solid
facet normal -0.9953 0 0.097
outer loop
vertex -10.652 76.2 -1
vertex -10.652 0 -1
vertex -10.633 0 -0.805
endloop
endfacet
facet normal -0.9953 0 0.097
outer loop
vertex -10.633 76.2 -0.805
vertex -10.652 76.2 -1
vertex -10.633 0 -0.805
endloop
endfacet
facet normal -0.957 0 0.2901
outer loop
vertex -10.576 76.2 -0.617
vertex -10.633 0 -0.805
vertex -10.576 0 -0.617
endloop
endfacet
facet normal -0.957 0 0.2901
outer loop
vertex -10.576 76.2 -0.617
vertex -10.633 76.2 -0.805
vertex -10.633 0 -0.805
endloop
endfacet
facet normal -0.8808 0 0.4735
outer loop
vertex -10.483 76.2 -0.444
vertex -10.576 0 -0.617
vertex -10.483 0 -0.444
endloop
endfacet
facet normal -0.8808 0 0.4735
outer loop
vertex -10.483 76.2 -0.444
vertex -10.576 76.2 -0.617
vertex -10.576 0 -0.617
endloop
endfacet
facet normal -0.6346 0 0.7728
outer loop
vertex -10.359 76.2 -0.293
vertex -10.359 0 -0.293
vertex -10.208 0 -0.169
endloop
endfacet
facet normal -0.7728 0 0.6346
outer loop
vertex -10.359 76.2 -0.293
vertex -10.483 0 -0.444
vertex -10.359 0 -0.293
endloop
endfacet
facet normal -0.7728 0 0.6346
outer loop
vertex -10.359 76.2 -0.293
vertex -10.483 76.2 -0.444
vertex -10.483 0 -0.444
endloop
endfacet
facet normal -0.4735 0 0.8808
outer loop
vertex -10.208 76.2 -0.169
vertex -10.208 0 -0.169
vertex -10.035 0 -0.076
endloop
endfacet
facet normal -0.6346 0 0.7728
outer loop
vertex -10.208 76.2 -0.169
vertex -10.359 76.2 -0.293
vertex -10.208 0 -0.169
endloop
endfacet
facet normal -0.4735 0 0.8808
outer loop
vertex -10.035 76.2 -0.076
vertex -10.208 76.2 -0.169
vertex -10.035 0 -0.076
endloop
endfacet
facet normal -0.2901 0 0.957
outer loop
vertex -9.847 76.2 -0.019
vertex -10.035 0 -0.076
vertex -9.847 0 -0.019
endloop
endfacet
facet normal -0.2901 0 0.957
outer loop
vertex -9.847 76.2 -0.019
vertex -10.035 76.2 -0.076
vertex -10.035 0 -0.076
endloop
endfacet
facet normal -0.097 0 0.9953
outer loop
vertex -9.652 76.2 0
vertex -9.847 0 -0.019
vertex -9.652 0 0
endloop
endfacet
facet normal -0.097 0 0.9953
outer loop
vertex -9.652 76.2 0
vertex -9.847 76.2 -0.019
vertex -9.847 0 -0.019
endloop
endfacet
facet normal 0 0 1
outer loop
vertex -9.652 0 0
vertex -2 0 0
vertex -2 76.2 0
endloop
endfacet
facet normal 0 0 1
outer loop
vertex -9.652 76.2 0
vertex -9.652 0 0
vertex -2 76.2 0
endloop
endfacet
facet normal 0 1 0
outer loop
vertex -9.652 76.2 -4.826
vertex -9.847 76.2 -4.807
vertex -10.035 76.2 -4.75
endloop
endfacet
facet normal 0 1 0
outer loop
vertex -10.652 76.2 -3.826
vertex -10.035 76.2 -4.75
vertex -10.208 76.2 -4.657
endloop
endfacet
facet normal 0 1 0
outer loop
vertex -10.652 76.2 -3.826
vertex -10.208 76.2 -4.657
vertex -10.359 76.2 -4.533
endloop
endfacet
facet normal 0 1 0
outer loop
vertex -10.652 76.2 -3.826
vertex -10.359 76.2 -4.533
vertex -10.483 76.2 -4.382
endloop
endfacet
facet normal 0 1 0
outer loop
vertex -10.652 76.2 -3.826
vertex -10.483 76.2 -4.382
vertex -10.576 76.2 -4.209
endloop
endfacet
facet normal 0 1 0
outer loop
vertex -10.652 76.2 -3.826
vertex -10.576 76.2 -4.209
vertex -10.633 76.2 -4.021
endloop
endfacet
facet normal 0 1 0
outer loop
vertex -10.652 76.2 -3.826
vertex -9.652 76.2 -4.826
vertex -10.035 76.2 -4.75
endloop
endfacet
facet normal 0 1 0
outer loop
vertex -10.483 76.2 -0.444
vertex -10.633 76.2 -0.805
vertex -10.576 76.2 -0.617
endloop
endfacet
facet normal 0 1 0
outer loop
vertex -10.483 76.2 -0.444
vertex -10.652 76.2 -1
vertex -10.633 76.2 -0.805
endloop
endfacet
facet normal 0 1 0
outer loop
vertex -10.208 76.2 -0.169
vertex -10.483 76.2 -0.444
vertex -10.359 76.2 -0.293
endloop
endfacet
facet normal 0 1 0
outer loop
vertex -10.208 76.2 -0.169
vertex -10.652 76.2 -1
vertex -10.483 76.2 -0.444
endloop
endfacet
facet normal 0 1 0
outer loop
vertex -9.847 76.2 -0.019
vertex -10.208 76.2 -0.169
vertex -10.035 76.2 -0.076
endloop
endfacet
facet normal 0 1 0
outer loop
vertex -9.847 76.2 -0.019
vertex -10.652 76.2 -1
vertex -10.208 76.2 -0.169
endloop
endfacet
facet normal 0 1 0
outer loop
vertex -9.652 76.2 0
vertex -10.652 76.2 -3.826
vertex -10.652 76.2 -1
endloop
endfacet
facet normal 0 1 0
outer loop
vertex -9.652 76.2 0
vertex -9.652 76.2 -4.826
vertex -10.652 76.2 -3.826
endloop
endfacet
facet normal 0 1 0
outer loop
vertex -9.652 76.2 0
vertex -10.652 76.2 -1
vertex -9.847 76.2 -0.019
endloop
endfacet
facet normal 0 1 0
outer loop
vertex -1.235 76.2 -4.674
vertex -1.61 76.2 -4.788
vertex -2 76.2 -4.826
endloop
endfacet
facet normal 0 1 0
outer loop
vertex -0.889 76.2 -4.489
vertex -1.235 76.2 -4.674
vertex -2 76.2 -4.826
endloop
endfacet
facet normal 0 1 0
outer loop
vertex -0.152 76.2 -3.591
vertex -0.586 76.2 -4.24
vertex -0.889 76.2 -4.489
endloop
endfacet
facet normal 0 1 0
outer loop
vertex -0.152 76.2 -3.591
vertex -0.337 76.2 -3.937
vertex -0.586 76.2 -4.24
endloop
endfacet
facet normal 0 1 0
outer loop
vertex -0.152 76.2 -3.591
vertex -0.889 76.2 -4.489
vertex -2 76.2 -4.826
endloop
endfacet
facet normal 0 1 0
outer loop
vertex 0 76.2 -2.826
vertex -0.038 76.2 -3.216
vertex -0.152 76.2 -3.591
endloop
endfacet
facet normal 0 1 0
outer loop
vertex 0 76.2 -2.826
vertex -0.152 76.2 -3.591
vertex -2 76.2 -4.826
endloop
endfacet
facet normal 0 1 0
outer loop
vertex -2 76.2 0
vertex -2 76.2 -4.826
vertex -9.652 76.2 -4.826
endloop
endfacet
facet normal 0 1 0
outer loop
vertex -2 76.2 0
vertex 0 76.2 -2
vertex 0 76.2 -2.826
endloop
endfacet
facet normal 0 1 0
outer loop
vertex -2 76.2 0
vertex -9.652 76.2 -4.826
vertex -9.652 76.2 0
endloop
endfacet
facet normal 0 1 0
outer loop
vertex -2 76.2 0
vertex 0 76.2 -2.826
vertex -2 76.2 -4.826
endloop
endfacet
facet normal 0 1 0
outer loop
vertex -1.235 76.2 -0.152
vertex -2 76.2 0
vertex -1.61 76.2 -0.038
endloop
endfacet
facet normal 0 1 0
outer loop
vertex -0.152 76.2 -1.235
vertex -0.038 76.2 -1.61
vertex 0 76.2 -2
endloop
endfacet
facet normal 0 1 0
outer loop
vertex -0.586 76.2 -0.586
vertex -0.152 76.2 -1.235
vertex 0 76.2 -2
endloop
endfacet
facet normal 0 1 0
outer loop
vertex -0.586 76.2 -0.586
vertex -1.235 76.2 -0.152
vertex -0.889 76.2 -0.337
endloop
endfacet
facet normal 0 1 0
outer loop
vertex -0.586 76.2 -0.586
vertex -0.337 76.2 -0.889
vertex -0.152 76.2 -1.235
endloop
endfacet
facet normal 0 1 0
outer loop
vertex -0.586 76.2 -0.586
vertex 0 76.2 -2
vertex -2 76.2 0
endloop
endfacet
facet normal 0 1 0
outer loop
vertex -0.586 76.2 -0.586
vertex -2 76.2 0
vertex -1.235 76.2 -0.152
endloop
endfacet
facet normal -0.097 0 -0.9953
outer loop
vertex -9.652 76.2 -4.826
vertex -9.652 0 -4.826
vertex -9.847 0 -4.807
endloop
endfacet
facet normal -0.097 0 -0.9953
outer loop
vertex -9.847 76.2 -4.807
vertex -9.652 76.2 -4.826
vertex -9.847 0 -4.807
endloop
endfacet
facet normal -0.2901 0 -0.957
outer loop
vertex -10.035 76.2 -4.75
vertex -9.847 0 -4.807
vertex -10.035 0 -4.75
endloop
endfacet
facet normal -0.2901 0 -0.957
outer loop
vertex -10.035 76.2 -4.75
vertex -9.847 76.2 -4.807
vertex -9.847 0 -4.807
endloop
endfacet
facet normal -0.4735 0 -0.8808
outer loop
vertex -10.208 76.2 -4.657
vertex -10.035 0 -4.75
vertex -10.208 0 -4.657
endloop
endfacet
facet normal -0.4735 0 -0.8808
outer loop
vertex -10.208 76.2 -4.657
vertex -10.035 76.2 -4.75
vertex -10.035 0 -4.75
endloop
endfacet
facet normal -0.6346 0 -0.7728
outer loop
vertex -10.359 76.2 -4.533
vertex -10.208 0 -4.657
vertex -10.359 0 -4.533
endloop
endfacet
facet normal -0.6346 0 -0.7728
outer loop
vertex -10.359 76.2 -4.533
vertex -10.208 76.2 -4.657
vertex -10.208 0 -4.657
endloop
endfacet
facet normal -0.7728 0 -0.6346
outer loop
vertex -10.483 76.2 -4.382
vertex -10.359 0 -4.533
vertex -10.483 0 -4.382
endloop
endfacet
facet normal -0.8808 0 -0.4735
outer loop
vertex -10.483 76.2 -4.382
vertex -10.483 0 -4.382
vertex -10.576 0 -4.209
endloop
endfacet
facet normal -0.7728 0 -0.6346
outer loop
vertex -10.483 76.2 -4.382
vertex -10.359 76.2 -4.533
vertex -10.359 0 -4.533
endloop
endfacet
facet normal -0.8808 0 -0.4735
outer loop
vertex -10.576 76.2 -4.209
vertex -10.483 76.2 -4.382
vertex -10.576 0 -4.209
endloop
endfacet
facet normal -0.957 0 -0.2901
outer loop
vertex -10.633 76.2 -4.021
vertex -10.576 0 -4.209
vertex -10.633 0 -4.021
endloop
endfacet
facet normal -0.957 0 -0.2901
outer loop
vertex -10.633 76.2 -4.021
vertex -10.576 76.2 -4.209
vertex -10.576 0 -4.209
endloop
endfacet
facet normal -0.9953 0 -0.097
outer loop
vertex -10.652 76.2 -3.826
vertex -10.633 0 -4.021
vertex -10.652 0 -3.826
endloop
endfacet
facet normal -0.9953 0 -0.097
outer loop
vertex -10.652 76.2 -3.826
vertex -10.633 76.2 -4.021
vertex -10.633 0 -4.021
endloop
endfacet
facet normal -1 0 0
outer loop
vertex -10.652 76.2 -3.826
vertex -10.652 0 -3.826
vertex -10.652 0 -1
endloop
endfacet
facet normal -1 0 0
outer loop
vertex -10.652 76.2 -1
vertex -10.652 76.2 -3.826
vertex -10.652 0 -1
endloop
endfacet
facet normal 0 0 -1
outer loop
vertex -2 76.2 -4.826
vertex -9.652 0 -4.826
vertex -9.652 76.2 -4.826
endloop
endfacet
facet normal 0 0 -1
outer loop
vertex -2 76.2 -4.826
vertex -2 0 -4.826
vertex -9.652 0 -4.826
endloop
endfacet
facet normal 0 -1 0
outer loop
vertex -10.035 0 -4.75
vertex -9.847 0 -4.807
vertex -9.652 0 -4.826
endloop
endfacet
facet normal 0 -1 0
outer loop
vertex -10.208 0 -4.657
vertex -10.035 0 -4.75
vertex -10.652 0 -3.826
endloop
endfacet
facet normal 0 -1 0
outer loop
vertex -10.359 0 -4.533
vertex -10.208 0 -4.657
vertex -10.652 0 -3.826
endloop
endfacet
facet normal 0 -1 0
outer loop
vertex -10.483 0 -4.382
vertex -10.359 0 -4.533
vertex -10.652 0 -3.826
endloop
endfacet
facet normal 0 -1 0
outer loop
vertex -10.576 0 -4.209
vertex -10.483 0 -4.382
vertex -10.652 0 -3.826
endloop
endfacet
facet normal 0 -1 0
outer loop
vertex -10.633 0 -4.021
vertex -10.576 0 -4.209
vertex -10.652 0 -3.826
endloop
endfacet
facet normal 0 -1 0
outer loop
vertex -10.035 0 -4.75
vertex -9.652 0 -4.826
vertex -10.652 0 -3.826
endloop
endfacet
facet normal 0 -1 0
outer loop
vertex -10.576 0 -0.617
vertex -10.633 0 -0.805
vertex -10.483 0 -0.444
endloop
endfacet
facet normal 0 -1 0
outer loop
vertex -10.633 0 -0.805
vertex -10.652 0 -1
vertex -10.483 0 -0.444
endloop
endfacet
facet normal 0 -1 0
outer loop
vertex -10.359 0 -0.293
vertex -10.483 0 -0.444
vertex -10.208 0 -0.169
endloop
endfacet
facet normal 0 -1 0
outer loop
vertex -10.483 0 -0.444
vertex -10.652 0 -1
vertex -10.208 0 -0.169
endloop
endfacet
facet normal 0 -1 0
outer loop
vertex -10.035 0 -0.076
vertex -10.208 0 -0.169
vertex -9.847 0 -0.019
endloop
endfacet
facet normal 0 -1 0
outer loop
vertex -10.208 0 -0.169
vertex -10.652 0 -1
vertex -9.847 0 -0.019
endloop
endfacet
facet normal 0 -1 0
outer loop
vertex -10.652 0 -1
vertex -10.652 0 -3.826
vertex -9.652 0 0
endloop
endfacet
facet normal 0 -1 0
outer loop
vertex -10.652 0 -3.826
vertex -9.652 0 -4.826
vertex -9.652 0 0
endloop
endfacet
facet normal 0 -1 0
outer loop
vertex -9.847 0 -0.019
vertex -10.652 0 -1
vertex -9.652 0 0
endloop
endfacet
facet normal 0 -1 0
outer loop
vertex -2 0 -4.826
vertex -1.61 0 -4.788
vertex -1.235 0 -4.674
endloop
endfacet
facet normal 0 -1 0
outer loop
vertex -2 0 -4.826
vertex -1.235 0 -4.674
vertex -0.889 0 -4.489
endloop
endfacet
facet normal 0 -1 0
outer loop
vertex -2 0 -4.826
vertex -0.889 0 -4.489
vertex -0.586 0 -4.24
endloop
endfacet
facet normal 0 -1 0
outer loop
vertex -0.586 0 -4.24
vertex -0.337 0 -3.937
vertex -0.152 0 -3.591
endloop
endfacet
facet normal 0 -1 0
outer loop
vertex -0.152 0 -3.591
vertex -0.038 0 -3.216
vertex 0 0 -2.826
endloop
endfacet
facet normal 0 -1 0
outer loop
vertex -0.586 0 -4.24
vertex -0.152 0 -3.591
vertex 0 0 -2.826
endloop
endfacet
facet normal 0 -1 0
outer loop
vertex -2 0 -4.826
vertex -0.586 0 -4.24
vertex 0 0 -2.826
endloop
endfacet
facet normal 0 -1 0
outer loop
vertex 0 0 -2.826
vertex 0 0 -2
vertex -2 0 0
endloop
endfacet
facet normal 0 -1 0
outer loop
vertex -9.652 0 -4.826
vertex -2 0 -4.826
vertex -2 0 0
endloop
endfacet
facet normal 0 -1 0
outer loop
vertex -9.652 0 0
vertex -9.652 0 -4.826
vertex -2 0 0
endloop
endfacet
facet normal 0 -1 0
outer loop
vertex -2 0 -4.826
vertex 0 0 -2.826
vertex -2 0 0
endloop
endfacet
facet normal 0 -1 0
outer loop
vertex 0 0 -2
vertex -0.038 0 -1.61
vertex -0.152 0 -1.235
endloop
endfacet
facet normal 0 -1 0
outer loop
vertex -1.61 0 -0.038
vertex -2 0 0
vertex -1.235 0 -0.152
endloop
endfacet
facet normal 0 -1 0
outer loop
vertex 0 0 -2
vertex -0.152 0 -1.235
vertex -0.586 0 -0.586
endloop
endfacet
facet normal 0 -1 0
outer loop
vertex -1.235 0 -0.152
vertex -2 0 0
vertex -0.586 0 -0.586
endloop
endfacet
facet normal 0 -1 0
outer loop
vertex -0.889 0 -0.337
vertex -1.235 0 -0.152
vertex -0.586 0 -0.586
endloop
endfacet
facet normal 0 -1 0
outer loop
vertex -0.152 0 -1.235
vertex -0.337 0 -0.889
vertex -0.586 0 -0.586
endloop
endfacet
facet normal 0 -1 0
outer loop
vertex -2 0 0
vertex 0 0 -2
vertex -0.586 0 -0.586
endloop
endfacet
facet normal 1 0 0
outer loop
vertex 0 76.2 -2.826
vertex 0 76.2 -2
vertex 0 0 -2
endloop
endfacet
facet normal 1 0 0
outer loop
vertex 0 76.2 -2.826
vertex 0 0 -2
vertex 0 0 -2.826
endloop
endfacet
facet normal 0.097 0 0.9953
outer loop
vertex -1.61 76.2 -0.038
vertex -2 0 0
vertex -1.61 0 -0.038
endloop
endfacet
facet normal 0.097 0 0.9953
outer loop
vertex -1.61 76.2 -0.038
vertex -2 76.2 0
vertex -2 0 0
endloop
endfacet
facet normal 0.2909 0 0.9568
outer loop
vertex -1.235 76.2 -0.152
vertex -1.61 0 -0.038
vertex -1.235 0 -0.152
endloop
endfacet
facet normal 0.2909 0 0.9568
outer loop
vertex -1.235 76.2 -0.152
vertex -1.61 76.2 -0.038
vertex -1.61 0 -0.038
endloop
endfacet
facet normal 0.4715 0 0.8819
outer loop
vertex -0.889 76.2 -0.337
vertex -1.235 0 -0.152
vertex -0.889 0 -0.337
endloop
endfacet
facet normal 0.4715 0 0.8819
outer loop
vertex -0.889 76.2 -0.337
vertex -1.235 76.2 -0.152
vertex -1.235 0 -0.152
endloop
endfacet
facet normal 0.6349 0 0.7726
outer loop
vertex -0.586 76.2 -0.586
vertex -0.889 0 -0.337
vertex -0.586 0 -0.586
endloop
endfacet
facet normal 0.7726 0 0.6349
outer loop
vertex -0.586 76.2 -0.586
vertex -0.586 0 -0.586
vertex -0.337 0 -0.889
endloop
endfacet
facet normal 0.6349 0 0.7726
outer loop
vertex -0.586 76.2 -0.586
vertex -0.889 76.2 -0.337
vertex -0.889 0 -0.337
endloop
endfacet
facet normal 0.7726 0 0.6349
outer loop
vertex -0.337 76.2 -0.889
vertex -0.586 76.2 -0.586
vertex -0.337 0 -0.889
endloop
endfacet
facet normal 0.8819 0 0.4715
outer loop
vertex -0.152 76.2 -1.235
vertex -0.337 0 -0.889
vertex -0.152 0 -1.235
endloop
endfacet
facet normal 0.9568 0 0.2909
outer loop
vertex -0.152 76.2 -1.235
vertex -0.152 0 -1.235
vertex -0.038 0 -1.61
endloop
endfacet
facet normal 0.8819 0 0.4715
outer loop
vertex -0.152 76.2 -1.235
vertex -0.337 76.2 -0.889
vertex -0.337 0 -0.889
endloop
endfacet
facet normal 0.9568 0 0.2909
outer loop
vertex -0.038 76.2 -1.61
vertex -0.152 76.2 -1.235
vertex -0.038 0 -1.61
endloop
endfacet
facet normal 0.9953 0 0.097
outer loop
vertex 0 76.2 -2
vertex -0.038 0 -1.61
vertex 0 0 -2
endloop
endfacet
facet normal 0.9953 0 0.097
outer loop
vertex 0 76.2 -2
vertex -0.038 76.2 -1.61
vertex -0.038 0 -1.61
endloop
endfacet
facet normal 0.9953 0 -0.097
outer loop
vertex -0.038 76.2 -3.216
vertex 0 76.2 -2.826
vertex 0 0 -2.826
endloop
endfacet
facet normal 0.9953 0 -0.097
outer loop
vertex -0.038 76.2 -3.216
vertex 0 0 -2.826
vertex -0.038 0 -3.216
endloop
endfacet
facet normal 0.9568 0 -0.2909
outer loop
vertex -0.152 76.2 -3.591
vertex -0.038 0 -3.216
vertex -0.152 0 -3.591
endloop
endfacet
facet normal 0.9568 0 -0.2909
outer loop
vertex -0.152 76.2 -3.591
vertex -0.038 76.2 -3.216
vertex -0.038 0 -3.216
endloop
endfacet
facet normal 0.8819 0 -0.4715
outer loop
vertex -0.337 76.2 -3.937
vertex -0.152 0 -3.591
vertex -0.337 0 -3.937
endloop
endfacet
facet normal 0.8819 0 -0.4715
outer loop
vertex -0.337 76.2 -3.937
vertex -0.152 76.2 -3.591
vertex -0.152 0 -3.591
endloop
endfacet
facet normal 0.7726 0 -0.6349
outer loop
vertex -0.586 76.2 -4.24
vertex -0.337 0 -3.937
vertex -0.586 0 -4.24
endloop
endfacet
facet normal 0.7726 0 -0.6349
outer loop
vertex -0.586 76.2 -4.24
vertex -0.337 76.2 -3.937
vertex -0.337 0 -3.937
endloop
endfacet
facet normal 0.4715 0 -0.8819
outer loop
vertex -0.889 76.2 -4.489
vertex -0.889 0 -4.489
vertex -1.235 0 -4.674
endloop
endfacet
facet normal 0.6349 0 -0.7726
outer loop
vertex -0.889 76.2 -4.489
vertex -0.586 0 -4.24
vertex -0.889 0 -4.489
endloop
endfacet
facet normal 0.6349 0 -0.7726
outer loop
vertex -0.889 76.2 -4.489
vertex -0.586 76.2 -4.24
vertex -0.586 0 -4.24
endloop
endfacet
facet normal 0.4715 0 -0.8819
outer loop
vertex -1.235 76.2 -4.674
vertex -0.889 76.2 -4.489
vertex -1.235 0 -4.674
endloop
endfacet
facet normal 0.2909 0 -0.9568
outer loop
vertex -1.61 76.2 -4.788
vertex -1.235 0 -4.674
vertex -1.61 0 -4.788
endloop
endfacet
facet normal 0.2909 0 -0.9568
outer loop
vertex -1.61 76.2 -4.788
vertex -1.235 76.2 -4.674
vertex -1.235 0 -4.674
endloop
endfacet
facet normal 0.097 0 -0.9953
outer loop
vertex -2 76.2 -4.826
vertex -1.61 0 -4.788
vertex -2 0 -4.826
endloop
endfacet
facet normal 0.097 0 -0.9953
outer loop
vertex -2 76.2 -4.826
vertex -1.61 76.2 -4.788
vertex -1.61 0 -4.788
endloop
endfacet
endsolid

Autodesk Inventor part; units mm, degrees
ref_plane "YZ Plane" through (0, 0, 0) normal (1, 0, 0) x (0, 1, 0)
ref_plane "XZ Plane" through (0, 0, 0) normal (0, 1, 0) x (-1, 0, 0)
ref_plane "XY Plane" through (0, 0, 0) normal (0, 0, 1) x (1, 0, 0)
sketch "Sketch1" plane through (0, 0, 0) normal (0, 1, 0) x (-1, 0, 0)
  line L0 (0, 0) -> (0, -4.826)
  line L1 (0, -4.826) -> (9.652, -4.826)
  line L2 (9.652, -4.826) -> (9.652, 0)
  line L3 (9.652, 0) -> (0, 0)
  dimension "d0" = 4.826
  dimension "d1" = 9.652
extrude "Extrusion1" add sketch "Sketch1" along normal blind 76.2
fillet "Fillet1" radius 2 2 edges at (0, 38.1, 0) (0, 38.1, -4.826)
sketch "Sketch2" plane through (-9.652, 0, -4.826) normal (-1, 0, 0) x (0, 0, 1)
  line L0 (4.826, 0) -> (4.826, 76.2) projected
  line L1 (0, 0) -> (0, 76.2) projected
  line L2 (0, 0) -> (4.826, 0) projected
  line L3 (0, 76.2) -> (4.826, 76.2) projected
extrude "Extrusion2" add sketch "Sketch2" along normal blind 1
fillet "Fillet2" radius 1 2 edges at (-10.652, 38.1, -4.826) (-10.652, 38.1, 0)
properties part number "GuideArm"
